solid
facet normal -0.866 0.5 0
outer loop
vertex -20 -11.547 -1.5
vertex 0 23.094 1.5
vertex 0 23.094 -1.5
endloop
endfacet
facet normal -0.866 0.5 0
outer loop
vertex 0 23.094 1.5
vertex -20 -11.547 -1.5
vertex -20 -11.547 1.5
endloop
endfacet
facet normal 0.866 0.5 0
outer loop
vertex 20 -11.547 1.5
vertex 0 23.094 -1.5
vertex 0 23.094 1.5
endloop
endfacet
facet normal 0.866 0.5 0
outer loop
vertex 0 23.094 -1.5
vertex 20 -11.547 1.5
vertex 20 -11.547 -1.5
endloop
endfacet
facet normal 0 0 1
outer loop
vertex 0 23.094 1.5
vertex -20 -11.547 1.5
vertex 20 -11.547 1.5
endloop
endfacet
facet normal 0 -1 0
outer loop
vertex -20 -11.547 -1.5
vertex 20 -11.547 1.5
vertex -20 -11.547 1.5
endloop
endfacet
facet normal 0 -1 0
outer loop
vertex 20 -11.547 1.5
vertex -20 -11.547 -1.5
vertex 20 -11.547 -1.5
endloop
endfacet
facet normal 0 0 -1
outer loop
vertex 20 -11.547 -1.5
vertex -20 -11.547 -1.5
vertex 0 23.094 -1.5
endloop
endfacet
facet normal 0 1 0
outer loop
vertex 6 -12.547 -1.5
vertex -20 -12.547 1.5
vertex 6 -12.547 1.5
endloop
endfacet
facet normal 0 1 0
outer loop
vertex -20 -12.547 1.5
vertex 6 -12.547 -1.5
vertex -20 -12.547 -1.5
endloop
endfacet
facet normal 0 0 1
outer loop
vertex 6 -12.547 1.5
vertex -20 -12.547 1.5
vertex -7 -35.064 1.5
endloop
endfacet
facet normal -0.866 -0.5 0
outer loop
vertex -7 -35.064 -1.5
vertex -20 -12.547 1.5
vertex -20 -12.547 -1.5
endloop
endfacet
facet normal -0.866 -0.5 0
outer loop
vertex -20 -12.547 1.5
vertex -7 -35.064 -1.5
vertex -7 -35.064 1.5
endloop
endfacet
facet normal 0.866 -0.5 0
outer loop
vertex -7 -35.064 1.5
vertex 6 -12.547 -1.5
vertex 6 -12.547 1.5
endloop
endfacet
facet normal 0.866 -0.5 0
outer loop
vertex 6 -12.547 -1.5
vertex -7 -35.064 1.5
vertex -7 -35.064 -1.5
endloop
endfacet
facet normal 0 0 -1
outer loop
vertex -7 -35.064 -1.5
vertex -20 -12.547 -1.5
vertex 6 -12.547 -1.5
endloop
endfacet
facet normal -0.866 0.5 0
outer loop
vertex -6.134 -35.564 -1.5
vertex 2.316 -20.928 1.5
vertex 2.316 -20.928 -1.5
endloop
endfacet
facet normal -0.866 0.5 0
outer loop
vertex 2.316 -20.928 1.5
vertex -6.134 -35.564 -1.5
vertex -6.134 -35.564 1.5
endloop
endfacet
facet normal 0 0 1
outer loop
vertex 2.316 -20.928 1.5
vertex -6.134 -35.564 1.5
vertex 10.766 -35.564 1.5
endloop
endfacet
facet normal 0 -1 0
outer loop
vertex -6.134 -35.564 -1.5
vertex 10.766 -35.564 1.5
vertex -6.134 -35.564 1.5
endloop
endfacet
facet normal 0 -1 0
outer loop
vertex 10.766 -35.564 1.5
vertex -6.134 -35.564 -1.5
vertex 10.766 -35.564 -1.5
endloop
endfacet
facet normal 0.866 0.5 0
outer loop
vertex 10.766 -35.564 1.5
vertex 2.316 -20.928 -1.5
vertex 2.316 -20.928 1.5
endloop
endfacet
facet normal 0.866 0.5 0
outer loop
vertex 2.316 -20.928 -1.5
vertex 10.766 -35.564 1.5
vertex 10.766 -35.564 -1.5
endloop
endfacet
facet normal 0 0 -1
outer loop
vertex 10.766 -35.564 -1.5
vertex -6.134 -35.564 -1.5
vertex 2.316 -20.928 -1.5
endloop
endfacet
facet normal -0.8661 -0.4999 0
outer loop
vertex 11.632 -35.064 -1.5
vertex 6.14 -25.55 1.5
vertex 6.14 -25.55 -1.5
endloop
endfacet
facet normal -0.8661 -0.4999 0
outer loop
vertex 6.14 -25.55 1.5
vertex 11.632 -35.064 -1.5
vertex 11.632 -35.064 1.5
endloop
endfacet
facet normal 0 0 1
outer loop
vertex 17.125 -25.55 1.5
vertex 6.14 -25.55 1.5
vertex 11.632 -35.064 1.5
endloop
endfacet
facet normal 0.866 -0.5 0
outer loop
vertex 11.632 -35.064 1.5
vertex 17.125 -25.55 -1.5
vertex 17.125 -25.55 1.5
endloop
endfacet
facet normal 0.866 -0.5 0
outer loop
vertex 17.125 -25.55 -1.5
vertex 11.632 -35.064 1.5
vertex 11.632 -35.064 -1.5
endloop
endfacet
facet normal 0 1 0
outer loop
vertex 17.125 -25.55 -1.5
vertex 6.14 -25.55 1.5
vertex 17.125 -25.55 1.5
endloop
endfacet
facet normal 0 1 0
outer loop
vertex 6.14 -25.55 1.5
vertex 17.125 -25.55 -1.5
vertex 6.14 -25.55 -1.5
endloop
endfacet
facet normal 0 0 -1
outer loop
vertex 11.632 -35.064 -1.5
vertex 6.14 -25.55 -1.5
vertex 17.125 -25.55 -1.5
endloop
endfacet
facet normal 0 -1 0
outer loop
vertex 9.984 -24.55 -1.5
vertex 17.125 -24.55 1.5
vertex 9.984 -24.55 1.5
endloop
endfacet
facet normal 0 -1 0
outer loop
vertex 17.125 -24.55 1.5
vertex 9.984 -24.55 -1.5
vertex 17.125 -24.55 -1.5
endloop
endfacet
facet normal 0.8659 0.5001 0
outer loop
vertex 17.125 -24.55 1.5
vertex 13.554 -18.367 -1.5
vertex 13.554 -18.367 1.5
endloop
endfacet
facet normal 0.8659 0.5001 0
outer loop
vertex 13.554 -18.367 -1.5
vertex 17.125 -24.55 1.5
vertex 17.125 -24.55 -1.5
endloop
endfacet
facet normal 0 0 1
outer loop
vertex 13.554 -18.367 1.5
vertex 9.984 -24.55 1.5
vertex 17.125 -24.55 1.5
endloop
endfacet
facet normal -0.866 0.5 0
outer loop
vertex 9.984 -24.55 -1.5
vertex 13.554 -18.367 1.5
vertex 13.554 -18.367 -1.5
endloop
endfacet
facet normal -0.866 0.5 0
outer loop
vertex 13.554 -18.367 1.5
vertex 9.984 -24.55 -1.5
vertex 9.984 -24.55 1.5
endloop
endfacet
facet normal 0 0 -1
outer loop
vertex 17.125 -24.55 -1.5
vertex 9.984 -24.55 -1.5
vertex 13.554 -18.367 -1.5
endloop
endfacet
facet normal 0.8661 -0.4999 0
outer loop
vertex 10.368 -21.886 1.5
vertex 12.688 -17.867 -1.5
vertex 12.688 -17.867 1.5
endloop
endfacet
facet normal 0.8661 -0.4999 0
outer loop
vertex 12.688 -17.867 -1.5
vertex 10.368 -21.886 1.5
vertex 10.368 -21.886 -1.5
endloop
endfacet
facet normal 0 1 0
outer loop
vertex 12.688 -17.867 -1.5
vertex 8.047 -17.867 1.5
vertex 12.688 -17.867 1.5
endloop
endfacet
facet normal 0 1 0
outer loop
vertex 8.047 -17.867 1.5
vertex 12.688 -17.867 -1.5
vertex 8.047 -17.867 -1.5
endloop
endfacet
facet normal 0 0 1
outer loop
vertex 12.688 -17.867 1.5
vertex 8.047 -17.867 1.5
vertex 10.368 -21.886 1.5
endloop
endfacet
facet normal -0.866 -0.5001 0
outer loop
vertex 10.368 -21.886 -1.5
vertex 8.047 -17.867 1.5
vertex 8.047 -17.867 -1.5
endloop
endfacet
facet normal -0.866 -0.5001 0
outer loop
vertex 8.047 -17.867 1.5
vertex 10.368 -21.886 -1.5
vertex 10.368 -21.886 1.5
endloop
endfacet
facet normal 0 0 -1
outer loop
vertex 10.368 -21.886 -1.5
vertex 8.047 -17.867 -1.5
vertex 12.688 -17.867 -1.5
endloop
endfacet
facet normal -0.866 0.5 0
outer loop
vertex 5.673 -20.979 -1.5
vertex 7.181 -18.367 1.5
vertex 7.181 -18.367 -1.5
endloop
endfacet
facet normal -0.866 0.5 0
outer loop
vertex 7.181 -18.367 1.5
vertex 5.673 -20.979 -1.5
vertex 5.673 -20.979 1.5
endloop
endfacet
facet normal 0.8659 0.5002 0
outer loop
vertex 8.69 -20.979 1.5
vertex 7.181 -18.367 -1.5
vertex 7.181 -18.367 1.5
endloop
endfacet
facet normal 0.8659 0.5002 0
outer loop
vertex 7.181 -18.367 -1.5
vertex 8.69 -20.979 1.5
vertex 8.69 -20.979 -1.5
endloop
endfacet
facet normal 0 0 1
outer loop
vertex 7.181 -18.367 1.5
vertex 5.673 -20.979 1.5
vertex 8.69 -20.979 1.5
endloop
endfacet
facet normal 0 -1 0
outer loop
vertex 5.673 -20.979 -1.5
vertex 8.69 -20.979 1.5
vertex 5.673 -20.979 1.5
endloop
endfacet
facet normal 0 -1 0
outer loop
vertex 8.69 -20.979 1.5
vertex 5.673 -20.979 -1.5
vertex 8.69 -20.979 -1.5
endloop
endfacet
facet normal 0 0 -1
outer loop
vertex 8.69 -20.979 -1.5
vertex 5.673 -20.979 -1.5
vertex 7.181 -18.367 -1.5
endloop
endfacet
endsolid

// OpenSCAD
//---------------------------------------------------------------
//-- Pybonacci logo in 3D, by Juan Gonzalez-Gomez (Obijuan)
//-- March - 2014
//---------------------------------------------------------------
//-- Released under the GPL v3 license
//---------------------------------------------------------------

//-- Pybonacci logo parameters
f = 0.65;      //-- Reduction factor
offset = 1;   //-- Distance between adjacent triangles
side = 40;    //-- Initial triangle side
ang = 60;     //-- Rotation angle
ov = [0, -1, 0];  //-- Unit vector perpendicular to the triangle's bottom side

//-- Constants for accessing the x,y and z components
X = 0;
Y = 1;
Z = 2;

//-- Rotate a vector an angle phi around the Z axis
//-- INPUTS:t
//--   v: Vector to rotate
//--   phi: Angle to rotate (in degrees)
function Rotz(v, phi) = [v[X] * cos(phi) - v[Y] * sin(phi), 
                         v[X] * sin(phi) + v[Y] * cos(phi), 
                         0];

//-- Pybonacci triangle. The logo is composed of 
//-- 7 of these equilateral triangles
module triangle(l = 10, th = 3)
{
  rotate([0, 0, -30])
  cylinder(r = l * sqrt(3) / 3,
           h = th,
	   center = true,
           $fn = 3);
}

module pybonacci_logo(pos, angle, side)
{
  translate(pos)
    rotate([0, 0, angle])
      triangle(l = side);          
}

//-- Calculate the normal distance of the next triangle
function Nv(n) = side * pow(f, n-1) * sqrt(3)*(1 + f) / 6 + offset;

//-- Calculate the tangencial distance of the next triangle
function Tv(n) = side * pow(f, n-1) * (1 - f) / 2;

//-- Calculate the relative distance between two triangles
//-- n is the triangle number
function Rel_Posv(n) = Rotz(ov, ang * (n - 1))      * Nv(n) + 
                       Rotz(ov, ang * (n-1) -90)  * Tv(n);



//---------------  Initial triangle 0 -------------
color([255/255, 211/255, 52/255])
pybonacci_logo(pos = [0, 0, 0],
               angle = 0, 
               side = side);

//--------------- Triangle 1 ----------------------
pos1 = Rel_Posv(1);     

color([255/255, 230/255, 113/255])
pybonacci_logo(pos = pos1,
               angle = ang,
               side = side * pow(f, 1));

//--------------- Triangle 2 ----------------------
pos2 = pos1 + Rel_Posv(2);       

color([112/255, 164/255, 203/255])
pybonacci_logo(pos = pos2,
               angle = ang * 2,
               side = side * pow(f, 2));

//--------------- Triangle 3 ----------------------   
pos3 = pos2 + Rel_Posv(3);       

color([80/255, 142/255, 191/255])
pybonacci_logo(pos = pos3,
               angle = ang * 3,
               side = side * pow(f, 3));

//--------------- Triangle 4 ----------------------  
pos4 = pos3 + Rel_Posv(4);       
       
color([68/255, 133/255, 187/255])
pybonacci_logo(pos = pos4,
               angle = ang * 4,
               side = side * pow(f, 4));

//--------------- Triangle 5 ----------------------
pos5 = pos4 + Rel_Posv(5);

color([63/255, 116/255, 168/255])
pybonacci_logo(pos = pos5,
               angle = ang * 5,
               side = side * pow(f, 5));

//--------------- Triangle 6 ----------------------
pos6 = pos5 + Rel_Posv(6);

color([60/255, 97/255, 126/255])
pybonacci_logo(pos = pos6,
               angle = ang * 6,
               side = side * pow(f, 6));

     
